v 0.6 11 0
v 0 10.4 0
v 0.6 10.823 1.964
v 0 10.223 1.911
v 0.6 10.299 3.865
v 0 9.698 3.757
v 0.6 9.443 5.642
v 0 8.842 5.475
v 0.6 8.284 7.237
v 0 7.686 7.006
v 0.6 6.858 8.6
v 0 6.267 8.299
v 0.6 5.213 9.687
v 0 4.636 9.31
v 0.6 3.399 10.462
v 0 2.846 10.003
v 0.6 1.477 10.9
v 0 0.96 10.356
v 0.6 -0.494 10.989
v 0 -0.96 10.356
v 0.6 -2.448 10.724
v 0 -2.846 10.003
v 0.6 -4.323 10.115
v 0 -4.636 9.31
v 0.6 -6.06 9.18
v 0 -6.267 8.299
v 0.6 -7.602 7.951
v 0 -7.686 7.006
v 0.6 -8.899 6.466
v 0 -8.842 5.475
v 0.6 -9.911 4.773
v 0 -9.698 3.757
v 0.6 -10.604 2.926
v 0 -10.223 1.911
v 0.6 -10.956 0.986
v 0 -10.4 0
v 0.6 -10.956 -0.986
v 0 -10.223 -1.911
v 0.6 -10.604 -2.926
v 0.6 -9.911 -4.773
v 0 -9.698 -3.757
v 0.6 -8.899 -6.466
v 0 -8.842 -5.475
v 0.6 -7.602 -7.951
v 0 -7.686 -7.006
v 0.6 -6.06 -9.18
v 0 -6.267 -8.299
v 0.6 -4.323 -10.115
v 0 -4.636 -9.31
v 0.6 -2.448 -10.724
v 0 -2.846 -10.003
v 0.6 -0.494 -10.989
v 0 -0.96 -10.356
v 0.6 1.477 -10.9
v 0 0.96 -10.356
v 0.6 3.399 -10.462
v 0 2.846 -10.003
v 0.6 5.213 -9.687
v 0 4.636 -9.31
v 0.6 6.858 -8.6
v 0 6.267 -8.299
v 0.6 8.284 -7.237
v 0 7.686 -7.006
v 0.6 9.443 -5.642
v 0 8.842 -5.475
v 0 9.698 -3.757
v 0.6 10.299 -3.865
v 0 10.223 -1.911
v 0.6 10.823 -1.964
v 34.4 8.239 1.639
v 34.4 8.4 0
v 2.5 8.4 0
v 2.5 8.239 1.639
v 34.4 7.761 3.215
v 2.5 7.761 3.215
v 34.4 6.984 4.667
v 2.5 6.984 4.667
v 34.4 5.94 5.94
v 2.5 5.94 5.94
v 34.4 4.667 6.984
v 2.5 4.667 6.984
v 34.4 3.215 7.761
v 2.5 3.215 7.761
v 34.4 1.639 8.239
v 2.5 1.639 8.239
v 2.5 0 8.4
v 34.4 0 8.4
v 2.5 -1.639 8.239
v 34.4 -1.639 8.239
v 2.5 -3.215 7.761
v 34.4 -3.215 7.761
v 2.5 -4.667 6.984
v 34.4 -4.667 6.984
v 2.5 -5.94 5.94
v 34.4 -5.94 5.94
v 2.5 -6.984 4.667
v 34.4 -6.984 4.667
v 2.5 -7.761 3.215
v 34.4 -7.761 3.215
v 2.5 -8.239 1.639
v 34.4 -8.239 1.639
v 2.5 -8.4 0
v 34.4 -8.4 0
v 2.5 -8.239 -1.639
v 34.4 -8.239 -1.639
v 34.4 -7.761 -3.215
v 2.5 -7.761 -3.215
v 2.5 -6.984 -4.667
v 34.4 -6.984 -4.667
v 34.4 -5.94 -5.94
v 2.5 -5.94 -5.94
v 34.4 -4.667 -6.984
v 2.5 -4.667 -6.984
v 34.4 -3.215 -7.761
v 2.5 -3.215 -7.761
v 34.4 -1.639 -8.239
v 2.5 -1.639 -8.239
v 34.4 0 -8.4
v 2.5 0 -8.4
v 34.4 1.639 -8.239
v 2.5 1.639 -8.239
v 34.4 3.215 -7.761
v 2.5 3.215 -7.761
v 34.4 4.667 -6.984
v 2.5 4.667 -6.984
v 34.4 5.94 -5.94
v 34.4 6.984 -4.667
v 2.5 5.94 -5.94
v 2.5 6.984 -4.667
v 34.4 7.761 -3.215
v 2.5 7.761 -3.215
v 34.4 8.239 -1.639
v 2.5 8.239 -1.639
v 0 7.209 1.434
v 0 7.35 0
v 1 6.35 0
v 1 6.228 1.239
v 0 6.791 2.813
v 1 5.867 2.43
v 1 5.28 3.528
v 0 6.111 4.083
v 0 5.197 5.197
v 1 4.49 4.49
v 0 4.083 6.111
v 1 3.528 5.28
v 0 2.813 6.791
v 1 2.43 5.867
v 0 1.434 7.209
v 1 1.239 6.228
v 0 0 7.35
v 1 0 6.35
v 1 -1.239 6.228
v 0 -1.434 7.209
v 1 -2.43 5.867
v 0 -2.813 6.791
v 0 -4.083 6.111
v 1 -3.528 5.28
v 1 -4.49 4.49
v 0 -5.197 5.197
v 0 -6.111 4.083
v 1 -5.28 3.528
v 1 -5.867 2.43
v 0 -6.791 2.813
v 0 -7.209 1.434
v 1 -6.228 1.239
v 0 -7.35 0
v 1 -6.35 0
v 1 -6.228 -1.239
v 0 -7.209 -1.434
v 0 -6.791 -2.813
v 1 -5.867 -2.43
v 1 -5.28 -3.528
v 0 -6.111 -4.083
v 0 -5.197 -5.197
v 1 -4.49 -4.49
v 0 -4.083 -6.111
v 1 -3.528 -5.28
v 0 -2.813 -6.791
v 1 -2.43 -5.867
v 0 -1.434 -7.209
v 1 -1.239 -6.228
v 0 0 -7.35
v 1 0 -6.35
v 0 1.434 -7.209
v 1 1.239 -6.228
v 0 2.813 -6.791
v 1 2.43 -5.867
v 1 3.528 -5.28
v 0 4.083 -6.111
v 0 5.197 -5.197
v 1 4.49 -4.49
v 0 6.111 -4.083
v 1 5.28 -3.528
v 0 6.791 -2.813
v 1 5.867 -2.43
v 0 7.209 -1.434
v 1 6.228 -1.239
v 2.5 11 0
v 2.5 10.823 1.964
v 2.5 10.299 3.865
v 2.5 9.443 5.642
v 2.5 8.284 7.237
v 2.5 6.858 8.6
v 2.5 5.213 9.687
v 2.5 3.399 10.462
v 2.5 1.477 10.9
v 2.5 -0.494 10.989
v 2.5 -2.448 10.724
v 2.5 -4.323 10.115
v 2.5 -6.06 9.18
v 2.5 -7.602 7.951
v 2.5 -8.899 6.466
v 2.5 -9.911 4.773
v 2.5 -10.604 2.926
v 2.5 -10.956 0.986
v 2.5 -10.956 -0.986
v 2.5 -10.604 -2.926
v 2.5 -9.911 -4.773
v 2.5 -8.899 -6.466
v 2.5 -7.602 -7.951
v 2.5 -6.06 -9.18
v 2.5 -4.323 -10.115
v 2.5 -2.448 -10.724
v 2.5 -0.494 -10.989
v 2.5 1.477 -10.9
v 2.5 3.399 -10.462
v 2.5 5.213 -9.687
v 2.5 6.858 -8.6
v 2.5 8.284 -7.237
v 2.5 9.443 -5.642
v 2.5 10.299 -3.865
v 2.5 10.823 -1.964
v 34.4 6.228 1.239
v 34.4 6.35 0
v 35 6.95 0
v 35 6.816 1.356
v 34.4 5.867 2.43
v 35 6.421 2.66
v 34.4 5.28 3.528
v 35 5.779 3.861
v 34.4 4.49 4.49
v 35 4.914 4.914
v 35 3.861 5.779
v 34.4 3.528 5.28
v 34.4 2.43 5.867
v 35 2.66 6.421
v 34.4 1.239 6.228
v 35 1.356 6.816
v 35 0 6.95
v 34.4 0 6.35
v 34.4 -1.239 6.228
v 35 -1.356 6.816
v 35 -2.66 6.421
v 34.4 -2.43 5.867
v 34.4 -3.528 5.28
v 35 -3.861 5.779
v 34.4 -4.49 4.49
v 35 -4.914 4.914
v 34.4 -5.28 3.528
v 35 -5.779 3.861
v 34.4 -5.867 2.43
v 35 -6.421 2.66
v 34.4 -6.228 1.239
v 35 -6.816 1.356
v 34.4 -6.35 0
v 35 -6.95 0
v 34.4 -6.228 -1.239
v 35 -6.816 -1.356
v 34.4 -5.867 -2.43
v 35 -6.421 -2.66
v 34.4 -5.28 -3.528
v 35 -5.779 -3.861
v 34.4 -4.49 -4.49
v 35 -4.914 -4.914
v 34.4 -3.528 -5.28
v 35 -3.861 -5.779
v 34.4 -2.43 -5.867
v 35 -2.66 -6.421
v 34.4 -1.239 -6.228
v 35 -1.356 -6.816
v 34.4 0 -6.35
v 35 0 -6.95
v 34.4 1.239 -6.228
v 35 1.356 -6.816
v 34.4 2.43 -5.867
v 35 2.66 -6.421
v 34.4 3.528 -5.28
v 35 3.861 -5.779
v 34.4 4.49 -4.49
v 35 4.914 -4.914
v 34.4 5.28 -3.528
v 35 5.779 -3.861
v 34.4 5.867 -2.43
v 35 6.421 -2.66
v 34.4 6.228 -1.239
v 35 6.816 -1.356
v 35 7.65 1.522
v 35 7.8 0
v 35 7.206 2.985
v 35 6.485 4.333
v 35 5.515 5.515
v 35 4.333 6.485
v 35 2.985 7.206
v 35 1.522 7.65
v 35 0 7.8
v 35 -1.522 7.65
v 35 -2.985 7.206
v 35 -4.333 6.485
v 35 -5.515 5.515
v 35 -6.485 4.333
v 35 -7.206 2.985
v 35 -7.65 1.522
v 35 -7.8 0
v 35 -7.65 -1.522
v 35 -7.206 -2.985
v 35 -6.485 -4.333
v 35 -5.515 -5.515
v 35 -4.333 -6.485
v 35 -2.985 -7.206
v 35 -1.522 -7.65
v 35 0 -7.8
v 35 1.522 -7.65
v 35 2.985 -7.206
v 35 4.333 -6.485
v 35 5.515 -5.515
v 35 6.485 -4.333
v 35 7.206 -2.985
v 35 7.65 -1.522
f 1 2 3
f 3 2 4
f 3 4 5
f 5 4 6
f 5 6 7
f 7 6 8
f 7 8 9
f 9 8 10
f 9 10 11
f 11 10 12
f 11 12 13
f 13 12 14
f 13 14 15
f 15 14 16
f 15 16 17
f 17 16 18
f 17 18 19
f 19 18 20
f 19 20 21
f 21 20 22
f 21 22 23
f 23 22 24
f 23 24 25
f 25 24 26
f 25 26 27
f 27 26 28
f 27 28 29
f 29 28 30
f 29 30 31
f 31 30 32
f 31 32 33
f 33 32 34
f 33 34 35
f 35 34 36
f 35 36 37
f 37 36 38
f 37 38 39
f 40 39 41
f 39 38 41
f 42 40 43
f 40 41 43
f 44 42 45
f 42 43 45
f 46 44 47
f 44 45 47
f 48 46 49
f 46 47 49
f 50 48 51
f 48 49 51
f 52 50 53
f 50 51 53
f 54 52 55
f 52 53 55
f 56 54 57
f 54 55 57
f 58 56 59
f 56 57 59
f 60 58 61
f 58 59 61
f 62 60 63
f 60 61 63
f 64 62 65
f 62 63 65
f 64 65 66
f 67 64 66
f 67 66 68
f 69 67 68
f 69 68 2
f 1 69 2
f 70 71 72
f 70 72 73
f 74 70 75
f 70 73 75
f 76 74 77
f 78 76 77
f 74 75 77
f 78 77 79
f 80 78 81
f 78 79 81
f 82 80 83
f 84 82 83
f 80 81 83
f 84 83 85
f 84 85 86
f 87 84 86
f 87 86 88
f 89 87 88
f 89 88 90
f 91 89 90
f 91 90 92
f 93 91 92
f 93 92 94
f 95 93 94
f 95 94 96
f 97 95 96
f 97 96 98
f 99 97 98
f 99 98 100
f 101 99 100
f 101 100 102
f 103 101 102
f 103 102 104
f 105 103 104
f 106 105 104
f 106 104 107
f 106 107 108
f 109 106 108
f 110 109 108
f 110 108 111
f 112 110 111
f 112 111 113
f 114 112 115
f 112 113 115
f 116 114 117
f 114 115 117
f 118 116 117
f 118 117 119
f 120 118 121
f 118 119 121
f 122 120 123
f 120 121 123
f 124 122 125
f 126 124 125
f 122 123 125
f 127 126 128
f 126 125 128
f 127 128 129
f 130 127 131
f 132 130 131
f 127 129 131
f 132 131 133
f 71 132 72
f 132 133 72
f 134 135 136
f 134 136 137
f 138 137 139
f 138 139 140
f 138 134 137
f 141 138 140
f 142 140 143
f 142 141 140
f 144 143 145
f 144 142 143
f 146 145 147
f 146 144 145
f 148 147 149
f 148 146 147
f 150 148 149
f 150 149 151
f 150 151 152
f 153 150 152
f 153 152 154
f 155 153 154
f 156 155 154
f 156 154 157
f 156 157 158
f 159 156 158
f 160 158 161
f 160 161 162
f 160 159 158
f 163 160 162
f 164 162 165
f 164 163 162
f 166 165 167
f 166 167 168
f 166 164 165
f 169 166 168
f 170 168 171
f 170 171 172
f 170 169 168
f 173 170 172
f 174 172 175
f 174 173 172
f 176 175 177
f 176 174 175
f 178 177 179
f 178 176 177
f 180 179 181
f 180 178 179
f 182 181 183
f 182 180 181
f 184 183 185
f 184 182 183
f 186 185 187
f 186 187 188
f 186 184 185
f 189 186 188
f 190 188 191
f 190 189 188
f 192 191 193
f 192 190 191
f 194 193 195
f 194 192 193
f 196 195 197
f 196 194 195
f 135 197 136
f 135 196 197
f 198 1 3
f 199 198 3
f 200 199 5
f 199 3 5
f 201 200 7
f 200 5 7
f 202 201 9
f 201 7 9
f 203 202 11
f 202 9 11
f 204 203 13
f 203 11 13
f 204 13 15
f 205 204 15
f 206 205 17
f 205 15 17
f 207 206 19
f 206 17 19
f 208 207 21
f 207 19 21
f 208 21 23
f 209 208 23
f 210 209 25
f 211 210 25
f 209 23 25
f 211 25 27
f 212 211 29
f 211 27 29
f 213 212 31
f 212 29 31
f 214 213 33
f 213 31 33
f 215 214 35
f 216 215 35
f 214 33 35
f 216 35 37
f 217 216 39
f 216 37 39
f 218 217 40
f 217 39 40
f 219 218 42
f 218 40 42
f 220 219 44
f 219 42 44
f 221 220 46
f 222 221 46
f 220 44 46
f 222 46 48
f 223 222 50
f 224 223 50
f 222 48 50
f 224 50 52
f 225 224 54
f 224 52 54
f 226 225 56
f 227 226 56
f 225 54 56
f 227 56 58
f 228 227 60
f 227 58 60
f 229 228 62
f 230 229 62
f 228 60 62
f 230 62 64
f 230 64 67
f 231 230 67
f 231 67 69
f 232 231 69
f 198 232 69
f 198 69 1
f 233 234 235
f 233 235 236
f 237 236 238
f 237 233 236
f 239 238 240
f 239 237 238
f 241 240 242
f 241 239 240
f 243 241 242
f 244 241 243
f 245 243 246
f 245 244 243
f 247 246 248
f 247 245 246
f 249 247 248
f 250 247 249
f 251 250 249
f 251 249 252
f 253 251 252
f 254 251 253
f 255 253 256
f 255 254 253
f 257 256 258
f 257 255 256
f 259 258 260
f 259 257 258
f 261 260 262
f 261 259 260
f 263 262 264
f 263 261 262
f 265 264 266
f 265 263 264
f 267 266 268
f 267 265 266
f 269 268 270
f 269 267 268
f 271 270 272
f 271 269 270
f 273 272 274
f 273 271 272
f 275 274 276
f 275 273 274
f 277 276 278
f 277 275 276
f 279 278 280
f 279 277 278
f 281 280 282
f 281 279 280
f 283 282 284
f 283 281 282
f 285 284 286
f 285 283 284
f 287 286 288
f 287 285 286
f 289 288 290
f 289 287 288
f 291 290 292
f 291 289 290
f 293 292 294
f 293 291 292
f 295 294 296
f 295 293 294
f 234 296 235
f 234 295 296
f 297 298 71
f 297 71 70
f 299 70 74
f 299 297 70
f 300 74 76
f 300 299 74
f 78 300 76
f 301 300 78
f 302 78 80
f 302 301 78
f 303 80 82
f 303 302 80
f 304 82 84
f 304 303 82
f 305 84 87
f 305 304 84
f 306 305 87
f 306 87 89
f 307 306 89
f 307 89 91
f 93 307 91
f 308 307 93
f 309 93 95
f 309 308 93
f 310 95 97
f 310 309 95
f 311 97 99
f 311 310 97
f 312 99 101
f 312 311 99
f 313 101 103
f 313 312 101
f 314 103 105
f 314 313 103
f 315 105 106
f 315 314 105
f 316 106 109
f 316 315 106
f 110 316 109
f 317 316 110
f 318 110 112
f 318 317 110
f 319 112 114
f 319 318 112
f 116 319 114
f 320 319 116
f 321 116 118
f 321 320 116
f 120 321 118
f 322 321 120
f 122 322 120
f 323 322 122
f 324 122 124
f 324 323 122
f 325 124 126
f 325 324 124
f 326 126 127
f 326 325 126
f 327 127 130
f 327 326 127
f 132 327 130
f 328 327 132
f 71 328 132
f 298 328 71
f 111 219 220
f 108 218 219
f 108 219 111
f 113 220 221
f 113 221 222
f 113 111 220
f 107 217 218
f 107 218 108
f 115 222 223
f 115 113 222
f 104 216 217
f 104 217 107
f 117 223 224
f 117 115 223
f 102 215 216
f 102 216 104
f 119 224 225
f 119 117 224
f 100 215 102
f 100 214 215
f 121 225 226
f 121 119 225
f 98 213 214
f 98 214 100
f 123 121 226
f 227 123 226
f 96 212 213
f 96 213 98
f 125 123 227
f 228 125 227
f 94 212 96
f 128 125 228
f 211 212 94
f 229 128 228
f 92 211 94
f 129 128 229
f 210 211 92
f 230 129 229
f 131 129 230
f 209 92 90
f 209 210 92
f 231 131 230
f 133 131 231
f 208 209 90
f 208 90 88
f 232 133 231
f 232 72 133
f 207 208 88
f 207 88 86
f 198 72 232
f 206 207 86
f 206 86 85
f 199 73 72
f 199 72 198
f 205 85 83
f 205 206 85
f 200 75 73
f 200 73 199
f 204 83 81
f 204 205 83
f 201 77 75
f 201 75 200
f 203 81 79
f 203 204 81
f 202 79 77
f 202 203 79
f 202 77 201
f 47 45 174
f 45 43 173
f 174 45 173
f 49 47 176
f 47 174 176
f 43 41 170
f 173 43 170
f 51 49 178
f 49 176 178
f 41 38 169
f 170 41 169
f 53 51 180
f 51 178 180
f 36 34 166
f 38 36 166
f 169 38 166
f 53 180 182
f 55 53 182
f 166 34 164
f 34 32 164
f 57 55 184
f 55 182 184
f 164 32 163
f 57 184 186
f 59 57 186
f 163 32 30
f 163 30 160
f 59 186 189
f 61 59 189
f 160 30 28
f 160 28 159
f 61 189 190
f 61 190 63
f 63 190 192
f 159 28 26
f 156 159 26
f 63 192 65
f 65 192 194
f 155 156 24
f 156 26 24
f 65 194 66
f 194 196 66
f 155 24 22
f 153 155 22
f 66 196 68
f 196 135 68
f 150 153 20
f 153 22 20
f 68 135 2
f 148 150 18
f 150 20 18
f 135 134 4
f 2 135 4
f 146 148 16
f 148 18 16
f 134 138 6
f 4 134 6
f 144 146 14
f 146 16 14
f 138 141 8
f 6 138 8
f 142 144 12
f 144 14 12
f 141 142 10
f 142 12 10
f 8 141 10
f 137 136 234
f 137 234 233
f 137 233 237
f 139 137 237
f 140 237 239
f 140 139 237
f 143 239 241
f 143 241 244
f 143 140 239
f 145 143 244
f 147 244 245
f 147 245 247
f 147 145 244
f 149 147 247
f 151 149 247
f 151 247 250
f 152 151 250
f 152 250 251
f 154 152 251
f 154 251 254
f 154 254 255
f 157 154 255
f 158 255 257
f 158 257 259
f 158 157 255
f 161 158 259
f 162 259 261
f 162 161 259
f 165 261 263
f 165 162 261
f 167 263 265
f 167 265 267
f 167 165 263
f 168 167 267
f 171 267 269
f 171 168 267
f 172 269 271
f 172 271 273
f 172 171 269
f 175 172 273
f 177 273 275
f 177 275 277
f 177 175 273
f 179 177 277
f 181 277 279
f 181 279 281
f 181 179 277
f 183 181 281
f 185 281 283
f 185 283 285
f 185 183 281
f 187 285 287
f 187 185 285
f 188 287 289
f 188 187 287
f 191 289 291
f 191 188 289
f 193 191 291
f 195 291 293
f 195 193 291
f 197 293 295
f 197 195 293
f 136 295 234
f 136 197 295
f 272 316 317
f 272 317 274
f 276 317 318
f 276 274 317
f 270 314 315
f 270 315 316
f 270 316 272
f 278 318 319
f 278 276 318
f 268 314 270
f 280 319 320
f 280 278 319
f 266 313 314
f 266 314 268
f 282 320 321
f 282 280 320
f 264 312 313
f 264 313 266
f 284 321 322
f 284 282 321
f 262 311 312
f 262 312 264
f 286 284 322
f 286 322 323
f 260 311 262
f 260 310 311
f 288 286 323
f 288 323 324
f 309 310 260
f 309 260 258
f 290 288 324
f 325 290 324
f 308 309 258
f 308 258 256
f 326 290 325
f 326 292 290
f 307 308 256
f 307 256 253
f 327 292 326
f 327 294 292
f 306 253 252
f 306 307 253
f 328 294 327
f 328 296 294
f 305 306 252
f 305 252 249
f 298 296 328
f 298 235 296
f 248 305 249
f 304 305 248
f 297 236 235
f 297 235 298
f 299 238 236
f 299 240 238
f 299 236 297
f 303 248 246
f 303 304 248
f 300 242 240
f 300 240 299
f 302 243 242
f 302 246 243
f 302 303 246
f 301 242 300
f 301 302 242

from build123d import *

# Parameters (mm, degrees)
F0_R     = 11
F0_R_2   = 8.4
F1_DEPTH = 2.5
F0_R_3   = 6.35
F2_DEPTH = 35
F3_SIZE  = 0.6
F4_SIZE  = 1


with BuildPart() as f1:
    # F0 (on Right) → F1 (new body)
    with BuildSketch(Plane.YZ):
        Circle(F0_R)
        Circle(F0_R_2, mode=Mode.SUBTRACT)
    extrude(amount=F1_DEPTH)

    # F0 (on Right) → F2 (join)
    with BuildSketch(Plane.YZ):
        Circle(F0_R_2)
        Circle(F0_R_3, mode=Mode.SUBTRACT)
    extrude(amount=F2_DEPTH)

    # F3
    f3_edges = [f1.edges().sort_by_distance(p)[0] for p in [
        (35, -6.35, 0),
        (35, -8.4, 0),
        (0, -11, 0),
    ]]
    chamfer(f3_edges, length=F3_SIZE)

    # F4
    f4_edges = [f1.edges().sort_by_distance(p)[0] for p in [
        (0, -6.35, 0),
    ]]
    chamfer(f4_edges, length=F4_SIZE)


solid = f1.part
